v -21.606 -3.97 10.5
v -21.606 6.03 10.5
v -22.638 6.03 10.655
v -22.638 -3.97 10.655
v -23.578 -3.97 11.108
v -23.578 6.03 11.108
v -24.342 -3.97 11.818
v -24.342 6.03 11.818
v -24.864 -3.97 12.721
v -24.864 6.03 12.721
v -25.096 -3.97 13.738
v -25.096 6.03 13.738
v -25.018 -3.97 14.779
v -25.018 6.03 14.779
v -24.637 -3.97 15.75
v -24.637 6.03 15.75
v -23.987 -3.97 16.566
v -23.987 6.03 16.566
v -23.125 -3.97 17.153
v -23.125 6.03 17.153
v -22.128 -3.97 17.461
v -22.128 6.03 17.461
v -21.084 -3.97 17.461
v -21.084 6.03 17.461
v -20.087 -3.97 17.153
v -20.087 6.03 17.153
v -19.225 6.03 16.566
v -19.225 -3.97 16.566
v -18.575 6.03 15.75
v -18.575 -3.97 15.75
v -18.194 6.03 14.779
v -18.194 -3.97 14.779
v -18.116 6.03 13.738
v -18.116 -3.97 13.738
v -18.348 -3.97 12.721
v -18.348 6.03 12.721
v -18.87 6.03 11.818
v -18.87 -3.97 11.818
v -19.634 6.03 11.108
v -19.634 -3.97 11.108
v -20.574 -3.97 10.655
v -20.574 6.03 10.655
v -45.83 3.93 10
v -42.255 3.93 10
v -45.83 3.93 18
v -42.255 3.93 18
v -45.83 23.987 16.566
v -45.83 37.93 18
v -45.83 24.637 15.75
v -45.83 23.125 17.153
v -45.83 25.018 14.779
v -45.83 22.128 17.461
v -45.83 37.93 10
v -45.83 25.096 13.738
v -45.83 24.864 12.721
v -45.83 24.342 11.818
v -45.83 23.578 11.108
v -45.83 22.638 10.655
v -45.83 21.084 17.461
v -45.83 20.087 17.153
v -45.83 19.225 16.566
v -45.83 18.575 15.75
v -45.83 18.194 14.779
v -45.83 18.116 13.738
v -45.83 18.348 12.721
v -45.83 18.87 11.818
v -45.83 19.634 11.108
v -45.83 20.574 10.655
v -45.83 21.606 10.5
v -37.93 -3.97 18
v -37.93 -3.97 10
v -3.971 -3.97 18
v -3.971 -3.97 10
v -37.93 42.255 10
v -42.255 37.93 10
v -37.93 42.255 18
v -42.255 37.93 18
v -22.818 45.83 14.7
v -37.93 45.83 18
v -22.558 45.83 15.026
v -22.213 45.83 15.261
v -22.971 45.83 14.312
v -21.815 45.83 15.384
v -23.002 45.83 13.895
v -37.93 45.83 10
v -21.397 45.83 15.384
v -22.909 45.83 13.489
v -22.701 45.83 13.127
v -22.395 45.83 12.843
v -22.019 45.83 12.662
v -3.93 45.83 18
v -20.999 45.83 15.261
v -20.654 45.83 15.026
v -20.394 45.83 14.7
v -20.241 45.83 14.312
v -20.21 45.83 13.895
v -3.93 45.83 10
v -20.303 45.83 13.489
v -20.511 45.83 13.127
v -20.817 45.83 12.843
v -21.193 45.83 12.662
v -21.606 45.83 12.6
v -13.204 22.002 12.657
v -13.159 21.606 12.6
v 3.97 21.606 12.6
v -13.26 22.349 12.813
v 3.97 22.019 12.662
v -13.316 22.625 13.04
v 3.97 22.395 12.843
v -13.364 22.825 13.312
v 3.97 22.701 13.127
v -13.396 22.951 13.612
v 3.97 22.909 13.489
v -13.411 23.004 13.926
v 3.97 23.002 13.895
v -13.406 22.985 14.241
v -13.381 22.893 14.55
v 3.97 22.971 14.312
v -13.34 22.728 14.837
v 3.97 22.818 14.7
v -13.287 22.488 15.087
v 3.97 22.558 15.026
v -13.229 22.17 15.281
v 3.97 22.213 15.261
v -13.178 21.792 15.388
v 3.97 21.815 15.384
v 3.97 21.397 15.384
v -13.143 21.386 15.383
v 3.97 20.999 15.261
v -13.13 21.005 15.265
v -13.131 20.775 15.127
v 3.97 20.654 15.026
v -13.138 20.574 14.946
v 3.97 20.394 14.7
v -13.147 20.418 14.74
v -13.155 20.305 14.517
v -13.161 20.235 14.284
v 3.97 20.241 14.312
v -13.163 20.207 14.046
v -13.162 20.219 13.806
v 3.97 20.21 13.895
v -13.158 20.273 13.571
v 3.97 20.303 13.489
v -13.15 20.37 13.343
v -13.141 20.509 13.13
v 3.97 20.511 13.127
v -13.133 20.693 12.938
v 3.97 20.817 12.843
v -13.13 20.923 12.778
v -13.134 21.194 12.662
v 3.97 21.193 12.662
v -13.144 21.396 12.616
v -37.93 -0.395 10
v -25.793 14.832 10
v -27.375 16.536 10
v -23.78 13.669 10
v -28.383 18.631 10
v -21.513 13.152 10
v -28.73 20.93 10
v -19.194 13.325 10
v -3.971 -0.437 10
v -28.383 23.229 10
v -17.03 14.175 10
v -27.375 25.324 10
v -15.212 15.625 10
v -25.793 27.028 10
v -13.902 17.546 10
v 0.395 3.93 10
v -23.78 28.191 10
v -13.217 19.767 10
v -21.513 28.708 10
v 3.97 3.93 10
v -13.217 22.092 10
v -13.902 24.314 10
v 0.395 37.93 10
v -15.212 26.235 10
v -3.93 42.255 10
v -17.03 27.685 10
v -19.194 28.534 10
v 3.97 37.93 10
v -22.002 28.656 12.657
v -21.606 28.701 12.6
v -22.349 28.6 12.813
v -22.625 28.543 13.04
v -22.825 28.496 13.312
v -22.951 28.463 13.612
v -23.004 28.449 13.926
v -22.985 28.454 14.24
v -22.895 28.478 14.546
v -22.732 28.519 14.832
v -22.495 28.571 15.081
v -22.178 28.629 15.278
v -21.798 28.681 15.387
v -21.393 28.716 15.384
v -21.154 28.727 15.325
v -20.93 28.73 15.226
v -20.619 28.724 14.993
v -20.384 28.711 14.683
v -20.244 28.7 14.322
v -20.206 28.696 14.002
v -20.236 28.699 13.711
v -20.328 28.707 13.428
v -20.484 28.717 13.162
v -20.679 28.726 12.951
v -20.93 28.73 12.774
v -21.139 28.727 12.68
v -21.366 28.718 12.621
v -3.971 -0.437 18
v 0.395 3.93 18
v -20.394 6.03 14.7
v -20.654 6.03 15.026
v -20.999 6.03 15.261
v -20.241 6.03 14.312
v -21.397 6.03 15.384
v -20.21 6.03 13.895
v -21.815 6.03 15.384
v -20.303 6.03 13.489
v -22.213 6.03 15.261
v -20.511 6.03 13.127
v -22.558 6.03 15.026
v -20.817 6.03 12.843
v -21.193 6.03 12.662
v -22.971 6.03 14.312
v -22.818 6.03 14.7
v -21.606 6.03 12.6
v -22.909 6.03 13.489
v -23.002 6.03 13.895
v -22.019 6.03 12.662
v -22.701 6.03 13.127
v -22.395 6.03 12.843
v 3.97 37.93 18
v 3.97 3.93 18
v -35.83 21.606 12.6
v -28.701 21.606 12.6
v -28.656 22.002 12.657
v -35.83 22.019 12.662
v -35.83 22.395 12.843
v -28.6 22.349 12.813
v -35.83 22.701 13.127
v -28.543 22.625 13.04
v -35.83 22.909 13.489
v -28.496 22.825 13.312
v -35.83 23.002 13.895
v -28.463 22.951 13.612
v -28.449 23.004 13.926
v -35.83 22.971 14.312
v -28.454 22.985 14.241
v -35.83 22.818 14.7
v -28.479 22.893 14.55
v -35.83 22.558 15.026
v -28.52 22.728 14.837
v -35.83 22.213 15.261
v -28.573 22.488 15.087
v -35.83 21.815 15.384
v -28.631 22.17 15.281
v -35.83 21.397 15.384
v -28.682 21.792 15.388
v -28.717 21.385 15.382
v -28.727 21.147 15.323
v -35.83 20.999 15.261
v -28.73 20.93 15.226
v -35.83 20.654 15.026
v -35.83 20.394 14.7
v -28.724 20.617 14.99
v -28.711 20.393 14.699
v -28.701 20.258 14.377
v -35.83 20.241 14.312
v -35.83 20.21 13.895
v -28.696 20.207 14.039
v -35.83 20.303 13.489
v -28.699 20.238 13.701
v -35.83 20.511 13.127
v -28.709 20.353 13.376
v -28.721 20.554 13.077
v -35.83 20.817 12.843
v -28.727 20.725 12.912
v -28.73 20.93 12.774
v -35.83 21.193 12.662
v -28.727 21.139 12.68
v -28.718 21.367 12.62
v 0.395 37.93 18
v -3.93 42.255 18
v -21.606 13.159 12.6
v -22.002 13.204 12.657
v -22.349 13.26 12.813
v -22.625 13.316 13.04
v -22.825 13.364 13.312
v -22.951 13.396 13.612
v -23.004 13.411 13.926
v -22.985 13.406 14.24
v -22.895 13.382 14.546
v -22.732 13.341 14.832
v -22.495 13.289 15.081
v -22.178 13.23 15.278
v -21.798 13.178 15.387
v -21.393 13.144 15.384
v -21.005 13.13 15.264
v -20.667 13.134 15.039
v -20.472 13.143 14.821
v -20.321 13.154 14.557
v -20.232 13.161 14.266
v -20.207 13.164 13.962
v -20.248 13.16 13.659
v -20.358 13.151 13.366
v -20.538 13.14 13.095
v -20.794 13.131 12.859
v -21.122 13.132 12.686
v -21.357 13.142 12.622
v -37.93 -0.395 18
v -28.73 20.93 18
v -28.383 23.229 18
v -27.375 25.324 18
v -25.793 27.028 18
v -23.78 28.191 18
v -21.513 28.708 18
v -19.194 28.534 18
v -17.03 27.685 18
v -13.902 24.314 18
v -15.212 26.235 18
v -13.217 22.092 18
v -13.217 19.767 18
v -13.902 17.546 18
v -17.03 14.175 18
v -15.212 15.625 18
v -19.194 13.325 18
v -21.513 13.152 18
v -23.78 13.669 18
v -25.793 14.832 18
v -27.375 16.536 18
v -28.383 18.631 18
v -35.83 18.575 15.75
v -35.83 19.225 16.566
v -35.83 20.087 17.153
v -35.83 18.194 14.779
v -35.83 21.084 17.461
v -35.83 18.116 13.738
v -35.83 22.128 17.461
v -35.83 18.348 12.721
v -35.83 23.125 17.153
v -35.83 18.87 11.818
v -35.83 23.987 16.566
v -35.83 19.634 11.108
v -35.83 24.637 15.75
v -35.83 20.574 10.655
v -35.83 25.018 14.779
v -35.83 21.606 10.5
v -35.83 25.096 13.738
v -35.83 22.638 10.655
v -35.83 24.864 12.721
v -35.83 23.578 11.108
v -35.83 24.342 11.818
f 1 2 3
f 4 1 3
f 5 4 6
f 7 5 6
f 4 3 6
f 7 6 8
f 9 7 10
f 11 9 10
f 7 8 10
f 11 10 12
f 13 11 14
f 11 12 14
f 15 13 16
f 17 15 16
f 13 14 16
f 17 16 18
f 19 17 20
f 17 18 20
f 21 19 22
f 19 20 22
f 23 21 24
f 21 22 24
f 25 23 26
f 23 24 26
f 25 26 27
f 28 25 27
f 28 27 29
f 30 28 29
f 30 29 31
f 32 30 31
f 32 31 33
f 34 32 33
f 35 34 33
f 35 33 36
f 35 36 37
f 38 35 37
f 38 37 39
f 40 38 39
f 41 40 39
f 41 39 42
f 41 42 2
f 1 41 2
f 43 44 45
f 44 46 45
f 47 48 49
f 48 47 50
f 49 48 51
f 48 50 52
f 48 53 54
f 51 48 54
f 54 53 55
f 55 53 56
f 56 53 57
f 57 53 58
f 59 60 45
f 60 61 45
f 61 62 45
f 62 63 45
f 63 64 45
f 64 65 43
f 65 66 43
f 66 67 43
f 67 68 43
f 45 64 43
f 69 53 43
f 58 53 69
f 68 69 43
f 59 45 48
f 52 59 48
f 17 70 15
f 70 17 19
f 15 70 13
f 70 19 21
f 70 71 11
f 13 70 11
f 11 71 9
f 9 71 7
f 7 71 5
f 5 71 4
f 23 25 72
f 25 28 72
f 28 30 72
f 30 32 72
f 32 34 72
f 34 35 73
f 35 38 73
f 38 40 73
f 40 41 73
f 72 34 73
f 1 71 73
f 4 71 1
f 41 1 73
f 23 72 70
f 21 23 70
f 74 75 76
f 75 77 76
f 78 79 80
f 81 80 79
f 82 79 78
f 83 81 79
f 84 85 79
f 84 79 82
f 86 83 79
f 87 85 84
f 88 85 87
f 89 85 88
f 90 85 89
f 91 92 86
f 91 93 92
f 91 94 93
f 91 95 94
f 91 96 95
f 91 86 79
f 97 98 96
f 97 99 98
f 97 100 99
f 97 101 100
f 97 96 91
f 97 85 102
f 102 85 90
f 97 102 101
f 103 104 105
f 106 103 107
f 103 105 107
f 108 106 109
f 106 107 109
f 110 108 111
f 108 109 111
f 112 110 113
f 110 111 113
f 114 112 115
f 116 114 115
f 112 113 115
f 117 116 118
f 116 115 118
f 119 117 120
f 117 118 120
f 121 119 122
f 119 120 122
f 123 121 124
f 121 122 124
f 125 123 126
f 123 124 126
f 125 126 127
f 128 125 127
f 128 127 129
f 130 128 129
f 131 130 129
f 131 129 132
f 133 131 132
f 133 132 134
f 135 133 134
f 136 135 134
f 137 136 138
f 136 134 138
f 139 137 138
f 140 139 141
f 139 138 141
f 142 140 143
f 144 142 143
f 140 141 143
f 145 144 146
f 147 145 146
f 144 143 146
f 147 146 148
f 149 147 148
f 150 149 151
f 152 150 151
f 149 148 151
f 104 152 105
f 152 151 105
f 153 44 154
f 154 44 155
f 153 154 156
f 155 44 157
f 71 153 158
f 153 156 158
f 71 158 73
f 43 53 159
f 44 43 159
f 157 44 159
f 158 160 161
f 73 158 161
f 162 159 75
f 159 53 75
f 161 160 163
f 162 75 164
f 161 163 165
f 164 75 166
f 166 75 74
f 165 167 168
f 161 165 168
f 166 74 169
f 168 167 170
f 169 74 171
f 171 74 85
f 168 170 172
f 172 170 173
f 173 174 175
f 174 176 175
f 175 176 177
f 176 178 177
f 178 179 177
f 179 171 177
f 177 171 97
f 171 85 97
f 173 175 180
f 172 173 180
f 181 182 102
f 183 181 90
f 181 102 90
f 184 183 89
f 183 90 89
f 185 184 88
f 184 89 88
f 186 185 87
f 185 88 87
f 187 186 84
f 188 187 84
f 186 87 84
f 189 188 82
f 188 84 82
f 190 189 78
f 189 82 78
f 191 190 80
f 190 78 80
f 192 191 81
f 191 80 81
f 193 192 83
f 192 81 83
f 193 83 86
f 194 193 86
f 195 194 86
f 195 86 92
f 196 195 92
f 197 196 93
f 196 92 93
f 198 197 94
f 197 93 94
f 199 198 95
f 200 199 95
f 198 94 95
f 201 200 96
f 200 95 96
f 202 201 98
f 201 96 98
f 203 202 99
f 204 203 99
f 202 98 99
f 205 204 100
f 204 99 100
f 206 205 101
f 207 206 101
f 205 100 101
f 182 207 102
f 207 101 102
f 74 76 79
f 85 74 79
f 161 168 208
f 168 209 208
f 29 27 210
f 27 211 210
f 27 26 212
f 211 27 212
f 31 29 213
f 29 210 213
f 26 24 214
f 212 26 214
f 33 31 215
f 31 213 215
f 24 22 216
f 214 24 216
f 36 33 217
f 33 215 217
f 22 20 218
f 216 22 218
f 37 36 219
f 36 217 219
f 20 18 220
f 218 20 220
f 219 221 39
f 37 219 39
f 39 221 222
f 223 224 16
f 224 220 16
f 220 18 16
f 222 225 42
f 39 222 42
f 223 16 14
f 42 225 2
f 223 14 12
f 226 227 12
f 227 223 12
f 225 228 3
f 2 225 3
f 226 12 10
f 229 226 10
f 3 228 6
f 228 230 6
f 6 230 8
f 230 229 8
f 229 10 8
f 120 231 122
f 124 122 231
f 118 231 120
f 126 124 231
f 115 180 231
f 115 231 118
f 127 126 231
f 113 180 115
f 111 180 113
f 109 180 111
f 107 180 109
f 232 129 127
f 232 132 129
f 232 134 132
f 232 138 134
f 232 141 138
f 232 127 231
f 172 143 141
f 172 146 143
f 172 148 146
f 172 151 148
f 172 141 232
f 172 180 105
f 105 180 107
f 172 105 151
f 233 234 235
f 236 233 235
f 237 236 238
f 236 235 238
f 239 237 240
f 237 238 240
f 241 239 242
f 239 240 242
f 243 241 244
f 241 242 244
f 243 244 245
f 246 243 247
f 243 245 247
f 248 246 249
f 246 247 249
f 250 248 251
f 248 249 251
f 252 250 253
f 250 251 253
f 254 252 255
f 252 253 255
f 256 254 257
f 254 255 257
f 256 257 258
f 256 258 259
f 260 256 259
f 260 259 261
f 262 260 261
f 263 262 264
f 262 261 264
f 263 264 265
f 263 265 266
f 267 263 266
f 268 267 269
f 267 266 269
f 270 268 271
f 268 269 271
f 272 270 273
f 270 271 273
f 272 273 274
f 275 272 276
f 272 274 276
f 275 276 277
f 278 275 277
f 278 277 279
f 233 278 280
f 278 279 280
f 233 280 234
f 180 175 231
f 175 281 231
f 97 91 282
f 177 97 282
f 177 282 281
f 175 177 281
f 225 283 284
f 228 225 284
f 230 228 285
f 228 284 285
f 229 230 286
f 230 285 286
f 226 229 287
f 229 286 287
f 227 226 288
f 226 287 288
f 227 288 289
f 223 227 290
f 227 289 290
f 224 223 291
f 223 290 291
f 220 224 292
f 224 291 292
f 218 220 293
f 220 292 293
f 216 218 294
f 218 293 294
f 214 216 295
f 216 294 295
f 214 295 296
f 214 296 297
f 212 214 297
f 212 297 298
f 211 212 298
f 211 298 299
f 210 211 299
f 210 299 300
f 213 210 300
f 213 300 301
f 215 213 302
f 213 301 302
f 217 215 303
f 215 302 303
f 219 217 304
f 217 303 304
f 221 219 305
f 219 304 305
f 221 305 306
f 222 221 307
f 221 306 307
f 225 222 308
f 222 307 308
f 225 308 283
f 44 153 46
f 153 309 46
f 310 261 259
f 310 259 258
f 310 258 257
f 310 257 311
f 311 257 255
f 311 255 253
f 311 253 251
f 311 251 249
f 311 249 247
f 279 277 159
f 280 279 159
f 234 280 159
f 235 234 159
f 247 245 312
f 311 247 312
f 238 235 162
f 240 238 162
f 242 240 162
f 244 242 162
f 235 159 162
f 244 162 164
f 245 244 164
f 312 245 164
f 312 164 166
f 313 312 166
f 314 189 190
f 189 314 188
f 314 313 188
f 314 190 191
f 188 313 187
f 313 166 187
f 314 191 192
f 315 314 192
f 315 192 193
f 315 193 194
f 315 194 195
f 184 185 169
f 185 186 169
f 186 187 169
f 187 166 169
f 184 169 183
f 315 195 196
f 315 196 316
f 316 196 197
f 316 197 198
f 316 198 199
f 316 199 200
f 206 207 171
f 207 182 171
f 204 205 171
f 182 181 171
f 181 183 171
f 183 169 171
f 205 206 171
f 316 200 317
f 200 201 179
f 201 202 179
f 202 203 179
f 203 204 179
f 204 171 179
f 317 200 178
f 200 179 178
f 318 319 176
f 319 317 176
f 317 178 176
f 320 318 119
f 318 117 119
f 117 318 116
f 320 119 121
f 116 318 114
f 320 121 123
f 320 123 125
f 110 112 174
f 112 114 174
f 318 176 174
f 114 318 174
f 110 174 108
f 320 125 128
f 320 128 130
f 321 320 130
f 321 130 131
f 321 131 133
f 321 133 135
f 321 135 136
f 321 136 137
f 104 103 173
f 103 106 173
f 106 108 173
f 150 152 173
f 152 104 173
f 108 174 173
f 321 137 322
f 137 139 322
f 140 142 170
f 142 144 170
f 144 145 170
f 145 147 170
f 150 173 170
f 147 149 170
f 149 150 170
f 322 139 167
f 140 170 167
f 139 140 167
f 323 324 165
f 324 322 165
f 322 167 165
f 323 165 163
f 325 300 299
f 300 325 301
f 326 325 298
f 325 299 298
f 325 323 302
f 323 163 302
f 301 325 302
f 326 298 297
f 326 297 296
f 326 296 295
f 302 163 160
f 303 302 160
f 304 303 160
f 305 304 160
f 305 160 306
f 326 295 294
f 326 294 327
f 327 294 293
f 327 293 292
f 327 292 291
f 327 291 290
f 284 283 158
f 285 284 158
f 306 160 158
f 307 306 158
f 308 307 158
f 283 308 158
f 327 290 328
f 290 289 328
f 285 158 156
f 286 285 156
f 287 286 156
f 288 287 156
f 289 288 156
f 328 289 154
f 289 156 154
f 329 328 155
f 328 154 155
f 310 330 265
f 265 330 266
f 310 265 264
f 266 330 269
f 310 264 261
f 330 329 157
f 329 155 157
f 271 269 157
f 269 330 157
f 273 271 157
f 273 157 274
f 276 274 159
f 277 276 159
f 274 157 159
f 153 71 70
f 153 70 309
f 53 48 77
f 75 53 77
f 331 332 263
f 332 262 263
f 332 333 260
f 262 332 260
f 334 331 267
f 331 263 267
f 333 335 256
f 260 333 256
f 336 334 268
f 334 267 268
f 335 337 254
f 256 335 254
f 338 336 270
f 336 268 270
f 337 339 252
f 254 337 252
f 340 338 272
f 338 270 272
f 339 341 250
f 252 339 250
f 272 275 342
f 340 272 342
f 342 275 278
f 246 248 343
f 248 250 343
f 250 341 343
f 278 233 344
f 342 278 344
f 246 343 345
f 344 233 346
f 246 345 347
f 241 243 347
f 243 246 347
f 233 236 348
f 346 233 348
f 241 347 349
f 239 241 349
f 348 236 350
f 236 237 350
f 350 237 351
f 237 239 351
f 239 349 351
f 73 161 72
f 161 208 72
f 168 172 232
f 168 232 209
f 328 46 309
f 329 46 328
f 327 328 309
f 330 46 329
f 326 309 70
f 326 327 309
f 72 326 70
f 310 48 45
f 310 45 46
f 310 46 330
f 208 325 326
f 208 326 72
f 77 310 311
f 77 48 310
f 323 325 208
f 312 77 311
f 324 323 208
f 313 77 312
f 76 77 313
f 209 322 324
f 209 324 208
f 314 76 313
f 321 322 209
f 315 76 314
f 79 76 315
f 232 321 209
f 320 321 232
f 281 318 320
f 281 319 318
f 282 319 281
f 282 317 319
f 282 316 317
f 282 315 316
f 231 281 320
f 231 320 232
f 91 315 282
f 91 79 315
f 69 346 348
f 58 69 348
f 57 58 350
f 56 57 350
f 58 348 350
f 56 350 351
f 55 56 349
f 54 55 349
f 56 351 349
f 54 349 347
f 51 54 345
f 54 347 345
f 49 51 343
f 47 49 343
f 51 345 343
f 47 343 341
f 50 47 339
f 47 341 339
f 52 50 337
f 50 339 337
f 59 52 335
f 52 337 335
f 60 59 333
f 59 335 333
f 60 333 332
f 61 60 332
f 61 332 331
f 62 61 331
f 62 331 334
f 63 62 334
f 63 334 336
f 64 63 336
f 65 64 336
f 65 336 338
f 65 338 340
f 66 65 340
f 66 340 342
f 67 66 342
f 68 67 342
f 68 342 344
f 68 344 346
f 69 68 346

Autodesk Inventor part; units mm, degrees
ref_plane "YZ Plane" through (0, 0, 0) normal (1, 0, 0) x (0, 1, 0)
ref_plane "XZ Plane" through (0, 0, 0) normal (0, 1, 0) x (-1, 0, 0)
ref_plane "Work Plane1" through (0, 0, 10) normal (0, 0, 1) x (1, 0, 0)
sketch "Sketch1" plane through (0, 0, 10) normal (0, 0, 1) x (1, 0, 0)
  line L0 (-4.0299, -0.3538) -> (-2.2322, 1.4439) construction
  arc A0 (-1.4439, 2.2322) -> (-2.2322, 1.4439) centre (-0.9299, 0.9299) ccw construction
  line L1 (-1.4439, 2.2322) -> (0.3538, 4.0299) construction
  line L2 (-37.8299, 42.8299) -> (-37.8299, 37.8299) construction
  line L3 (-37.8299, 37.8299) -> (-42.9208, 37.8299) construction
  line L4 (-37.8299, 42.2137) -> (-37.8299, 45.8299) construction
  line L5 (-37.8299, 45.8299) -> (-4.0299, 45.8299) construction
  line L6 (-4.0299, 45.8299) -> (-4.0299, 42.2137) construction
  line L7 (-4.0299, 4.0299) -> (0.3538, 4.0299) projected
  circle A1 centre (-20.9299, 20.9299) radius 17.5 projected
  line L8 (-20.9299, 58.9723) -> (17.1124, 20.9299) construction
  line L9 (17.1124, 20.9299) -> (-20.9299, -17.1124) construction
  line L10 (-20.9299, -17.1124) -> (-58.9723, 20.9299) construction
  line L11 (-58.9723, 20.9299) -> (-20.9299, 58.9723) construction
  line L12 (-20.9299, 58.9723) -> (-20.9299, -17.1124) construction
  line L13 (17.1124, 20.9299) -> (-58.9723, 20.9299) construction
  line L14 (-20.9299, 58.9723) -> (32.8701, 58.9723) construction
  line L15 (-43.4299, 43.4299) -> (1.5701, 43.4299) construction
  line L16 (1.5701, 43.4299) -> (1.5701, -1.5701) construction
  line L17 (1.5701, -1.5701) -> (-43.4299, -1.5701) construction
  line L18 (-43.4299, -1.5701) -> (-43.4299, 43.4299) construction
  line L19 (-43.4299, 43.4299) -> (1.5701, -1.5701) construction
  line L20 (1.5701, 43.4299) -> (-43.4299, -1.5701) construction
  line L21 (-43.4299, 5.3876) -> (-43.4299, 36.4723)
  line L22 (-43.4299, 36.4723) -> (-36.4723, 43.4299)
  line L23 (-36.4723, 43.4299) -> (-5.3876, 43.4299)
  line L24 (-5.3876, 43.4299) -> (1.5701, 36.4723)
  line L25 (1.5701, 36.4723) -> (1.5701, 5.3876)
  line L26 (1.5701, 5.3876) -> (-5.3876, -1.5701)
  line L27 (-5.3876, -1.5701) -> (-36.4723, -1.5701)
  line L28 (-36.4723, -1.5701) -> (-43.4299, 5.3876)
  line L29 (-4.0299, 42.2137) -> (-37.8299, 42.2137) projected
  line L30 (-4.0299, -0.3538) -> (-4.0299, 4.0299) projected
  circle A2 centre (-20.9299, 20.9299) radius 1.5
  line L31 (-10.9299, 10.9299) -> (-30.9299, 10.9299) construction
  line L32 (-30.9299, 10.9299) -> (-30.9299, 30.9299) construction
  line L33 (-30.9299, 30.9299) -> (-10.9299, 30.9299) construction
  line L34 (-10.9299, 30.9299) -> (-10.9299, 10.9299) construction
  line L35 (-10.9299, 10.9299) -> (-30.9299, 30.9299) construction
  line L36 (-30.9299, 10.9299) -> (-10.9299, 30.9299) construction
  circle A3 centre (-30.9299, 30.9299) radius 1.4
  circle A4 centre (-30.9299, 10.9299) radius 1.4
  circle A5 centre (-10.9299, 10.9299) radius 1.4
  line L37 (-45.8299, 37.8299) -> (-42.0723, 37.8299) construction
  line L38 (-42.1723, 37.7299) -> (-45.8299, 37.7299)
  line L39 (-45.8299, 37.7299) -> (-45.8299, 4.1299)
  line L40 (-45.8299, 4.1299) -> (-42.1723, 4.1299)
  line L41 (-42.1723, 4.1299) -> (-42.1723, 37.7299)
  line L42 (-45.8299, 4.0299) -> (-42.0723, 4.0299) construction
  line L43 (-45.8299, 37.8299) -> (-42.0723, 37.8299) projected
  line L44 (-37.7299, 45.8299) -> (-4.1299, 45.8299)
  line L45 (-4.1299, 45.8299) -> (-4.1299, 42.1723)
  line L46 (-4.1299, 42.1723) -> (-37.7299, 42.1723)
  line L47 (-37.7299, 42.1723) -> (-37.7299, 45.8299)
  line L48 (0.4701, 37.8299) -> (0.4701, 4.0299) construction
  line L49 (0.4701, 4.0299) -> (3.9701, 4.0299) construction
  line L50 (3.9701, 37.8299) -> (3.9701, 4.0299) construction
  line L51 (0.4701, 37.8299) -> (3.9701, 37.8299) construction
  line L52 (-45.8299, -3.9701) -> (-4.0299, -3.9701) construction
  line L53 (0.3124, 37.7299) -> (3.9701, 37.7299)
  line L54 (3.9701, 37.7299) -> (3.9701, 4.1299)
  line L55 (3.9701, 4.1299) -> (0.3124, 4.1299)
  line L56 (0.3124, 4.1299) -> (0.3124, 37.7299)
  line L57 (-4.1713, -0.3538) -> (-37.7299, -0.3538)
  line L58 (-37.7299, -0.3538) -> (-37.7299, -3.9701)
  line L59 (-37.7299, -3.9701) -> (-4.1713, -3.9701)
  line L60 (-4.1713, -3.9701) -> (-4.1713, -0.3538)
  point P0 (-37.8299, 4.0299)
  dimension "d18" = 53.8
  dimension "d19" = 45
  dimension "d20" = 53.8
  dimension "d21" = 45
  dimension "d22" = 45
  dimension "d30" = 20
  dimension "d31" = 20
  dimension "d32" = 2.8
  dimension "d33" = 2.8
  dimension "d34" = 2.8
  dimension "d35" = 3
  dimension "d36" = 0.1
  dimension "d37" = 0.1
  dimension "d38" = 0.1
  dimension "d39" = 0.1
extrude "Extrusion1" add sketch "Sketch1" along normal blind 8 contours L30 L26 L57 L28 L41 L22 L46 L24 L56 L7 | L7 L26 L30 | L56 L24 L25 L26 | L26 L25 L24 L53 L54 L55 | L60 L59 L58 L57 L28 L27 L26 | L26 L27 L28 L57 | L46 L22 L29 L24 | L24 L29 L45 | L40 L39 L38 L22 L21 L28 | L28 L21 L22 L41 | L29 L22 L23 L24 | L24 L23 L22 L29 L47 L44 L45 | L47 L29 L22 | A1 | A2 | A3 | A4 | A5
sketch "Skizze4" plane through (0, 0, 18) normal (0, 0, 1) x (1, 0, 0)
  line L0 (-37.7299, 42.1723) -> (-42.1723, 37.7299) projected
  line L1 (-42.1723, 37.7299) -> (-45.8299, 37.7299) projected
  line L2 (-45.8299, 37.7299) -> (-45.8299, 4.1299) construction
  line L3 (-45.8299, 4.1299) -> (-42.1723, 4.1299) projected
  line L4 (-42.1723, 4.1299) -> (-37.6885, -0.3538) projected
  line L5 (-37.6885, -0.3538) -> (-37.7299, -0.3538) projected
  line L6 (-37.7299, -0.3538) -> (-37.7299, -3.9701) projected
  line L7 (-37.7299, -3.9701) -> (-4.1713, -3.9701) construction
  line L8 (-4.1713, -3.9701) -> (-4.1713, -0.3538) projected
  line L9 (-4.1713, -0.3538) -> (0.3124, 4.1299) projected
  line L10 (0.3124, 4.1299) -> (3.9701, 4.1299) projected
  line L11 (3.9701, 4.1299) -> (3.9701, 37.7299) construction
  line L12 (3.9701, 37.7299) -> (0.3124, 37.7299) projected
  line L13 (0.3124, 37.7299) -> (-4.1299, 42.1723) projected
  line L14 (-4.1299, 42.1723) -> (-4.1299, 45.8299) projected
  line L15 (-4.1299, 45.8299) -> (-37.7299, 45.8299) construction
  line L16 (-37.7299, 45.8299) -> (-37.7299, 42.1723) projected
  line L17 (-37.9299, 46.0299) -> (-3.9299, 46.0299) construction
  line L18 (-3.9299, 46.0299) -> (-3.9299, 42.2551)
  line L19 (-3.9299, 42.2551) -> (0.3953, 37.9299)
  line L20 (0.3953, 37.9299) -> (4.1701, 37.9299)
  line L21 (4.1701, 37.9299) -> (4.1701, 3.9299) construction
  line L22 (4.1701, 3.9299) -> (0.3953, 3.9299)
  line L23 (0.3953, 3.9299) -> (-3.9713, -0.4367)
  line L24 (-3.9713, -0.4367) -> (-3.9713, -4.1701)
  line L25 (-3.9713, -4.1701) -> (-37.9299, -4.1701) construction
  line L26 (-37.9299, -4.1701) -> (-37.9299, -0.3953)
  line L27 (-37.9299, -0.3953) -> (-42.2551, 3.9299)
  line L28 (-42.2551, 3.9299) -> (-46.0299, 3.9299)
  line L29 (-46.0299, 3.9299) -> (-46.0299, 37.9299) construction
  line L30 (-46.0299, 37.9299) -> (-42.2551, 37.9299)
  line L31 (-42.2551, 37.9299) -> (-37.9299, 42.2551)
  line L32 (-37.9299, 42.2551) -> (-37.9299, 46.0299)
  line L33 (-45.8299, 37.7299) -> (-45.8299, 37.9299)
  line L34 (-4.1299, 45.8299) -> (-37.7299, 45.8299) projected
  line L35 (-37.7299, 45.8299) -> (-37.9299, 45.8299)
  line L36 (-4.1299, 45.8299) -> (-3.9299, 45.8299)
  line L37 (3.9701, 37.7299) -> (3.9701, 37.9299)
  line L38 (3.9701, 4.1299) -> (3.9701, 37.7299) projected
  line L39 (3.9701, 4.1299) -> (3.9701, 3.9299)
  line L40 (-4.1713, -3.9701) -> (-3.9713, -3.9701)
  line L41 (-37.7299, -3.9701) -> (-37.9299, -3.9701)
  line L42 (-45.8299, 4.1299) -> (-45.8299, 3.9299)
  point P0 (0, 0)
  dimension "d40" = 0.2
extrude "IM_offset" add sketch "Skizze4" against normal up to surface (8 mm away)
sketch "Sketch25" plane through (0, 0, 10) normal (0, 0, -1) x (-1, 0, 0)
  circle A0 centre (20.9299, 20.9299) radius 7.8
  line L0 (3.9713, -3.9701) -> (37.9299, -3.9701) projected
  line L1 (37.9299, -3.9701) -> (37.9299, -0.3953) projected
  line L2 (37.9299, -0.3953) -> (42.2551, 3.9299) projected
  line L3 (42.2551, 3.9299) -> (45.8299, 3.9299) projected
  line L4 (45.8299, 3.9299) -> (45.8299, 37.9299) projected
  line L5 (45.8299, 37.9299) -> (42.2551, 37.9299) projected
  line L6 (42.2551, 37.9299) -> (37.9299, 42.2551) projected
  line L7 (37.9299, 42.2551) -> (37.9299, 45.8299) projected
  line L8 (37.9299, 45.8299) -> (3.9299, 45.8299) projected
  line L9 (3.9299, 45.8299) -> (3.9299, 42.2551) projected
  line L10 (3.9299, 42.2551) -> (-0.3953, 37.9299) projected
  line L11 (-0.3953, 37.9299) -> (-3.9701, 37.9299) projected
  line L12 (-3.9701, 37.9299) -> (-3.9701, 3.9299) projected
  line L13 (-3.9701, 3.9299) -> (-0.3953, 3.9299) projected
  line L14 (-0.3953, 3.9299) -> (3.9713, -0.4367) projected
  line L15 (3.9713, -0.4367) -> (3.9713, -3.9701) projected
  circle A1 centre (20.9299, 20.9299) radius 24.9
  point P0 (0, 0)
  dimension "d167" = 15.6
extrude "Extrusion21" cut sketch "Sketch25" against normal through all contours A0
sketch "Sketch26" plane through (-37.9299, -3.9701, 10) normal (0, -1, 0) x (1, 0, 0)
  line L0 (8.25, 4.8) -> (8.25, 11.5)
  line L1 (10.75, 4.8) -> (10.75, 11.5)
  circle A0 centre (16.3239, 4) radius 1.4
  line L2 (33.9586, 8) -> (0, 8) projected
  point P0 (37.9299, -10)
  dimension "d155" = 2.8
  dimension "d156" = 4
hole "Hole1" at (-21.606, -3.9701, 14) direction (0, 1, 0) diameter 2.8 end through all counterbore diameter 7 counterbore depth 10
pattern_circular "Circular Pattern1" count 2 over 90 about axis through (-20.9299, 20.9299, 10) along (0, 0, -1) of "Hole1", "Extrusion21"
properties part number "20_Cube_Insert_Fiber_STMount_Center"
